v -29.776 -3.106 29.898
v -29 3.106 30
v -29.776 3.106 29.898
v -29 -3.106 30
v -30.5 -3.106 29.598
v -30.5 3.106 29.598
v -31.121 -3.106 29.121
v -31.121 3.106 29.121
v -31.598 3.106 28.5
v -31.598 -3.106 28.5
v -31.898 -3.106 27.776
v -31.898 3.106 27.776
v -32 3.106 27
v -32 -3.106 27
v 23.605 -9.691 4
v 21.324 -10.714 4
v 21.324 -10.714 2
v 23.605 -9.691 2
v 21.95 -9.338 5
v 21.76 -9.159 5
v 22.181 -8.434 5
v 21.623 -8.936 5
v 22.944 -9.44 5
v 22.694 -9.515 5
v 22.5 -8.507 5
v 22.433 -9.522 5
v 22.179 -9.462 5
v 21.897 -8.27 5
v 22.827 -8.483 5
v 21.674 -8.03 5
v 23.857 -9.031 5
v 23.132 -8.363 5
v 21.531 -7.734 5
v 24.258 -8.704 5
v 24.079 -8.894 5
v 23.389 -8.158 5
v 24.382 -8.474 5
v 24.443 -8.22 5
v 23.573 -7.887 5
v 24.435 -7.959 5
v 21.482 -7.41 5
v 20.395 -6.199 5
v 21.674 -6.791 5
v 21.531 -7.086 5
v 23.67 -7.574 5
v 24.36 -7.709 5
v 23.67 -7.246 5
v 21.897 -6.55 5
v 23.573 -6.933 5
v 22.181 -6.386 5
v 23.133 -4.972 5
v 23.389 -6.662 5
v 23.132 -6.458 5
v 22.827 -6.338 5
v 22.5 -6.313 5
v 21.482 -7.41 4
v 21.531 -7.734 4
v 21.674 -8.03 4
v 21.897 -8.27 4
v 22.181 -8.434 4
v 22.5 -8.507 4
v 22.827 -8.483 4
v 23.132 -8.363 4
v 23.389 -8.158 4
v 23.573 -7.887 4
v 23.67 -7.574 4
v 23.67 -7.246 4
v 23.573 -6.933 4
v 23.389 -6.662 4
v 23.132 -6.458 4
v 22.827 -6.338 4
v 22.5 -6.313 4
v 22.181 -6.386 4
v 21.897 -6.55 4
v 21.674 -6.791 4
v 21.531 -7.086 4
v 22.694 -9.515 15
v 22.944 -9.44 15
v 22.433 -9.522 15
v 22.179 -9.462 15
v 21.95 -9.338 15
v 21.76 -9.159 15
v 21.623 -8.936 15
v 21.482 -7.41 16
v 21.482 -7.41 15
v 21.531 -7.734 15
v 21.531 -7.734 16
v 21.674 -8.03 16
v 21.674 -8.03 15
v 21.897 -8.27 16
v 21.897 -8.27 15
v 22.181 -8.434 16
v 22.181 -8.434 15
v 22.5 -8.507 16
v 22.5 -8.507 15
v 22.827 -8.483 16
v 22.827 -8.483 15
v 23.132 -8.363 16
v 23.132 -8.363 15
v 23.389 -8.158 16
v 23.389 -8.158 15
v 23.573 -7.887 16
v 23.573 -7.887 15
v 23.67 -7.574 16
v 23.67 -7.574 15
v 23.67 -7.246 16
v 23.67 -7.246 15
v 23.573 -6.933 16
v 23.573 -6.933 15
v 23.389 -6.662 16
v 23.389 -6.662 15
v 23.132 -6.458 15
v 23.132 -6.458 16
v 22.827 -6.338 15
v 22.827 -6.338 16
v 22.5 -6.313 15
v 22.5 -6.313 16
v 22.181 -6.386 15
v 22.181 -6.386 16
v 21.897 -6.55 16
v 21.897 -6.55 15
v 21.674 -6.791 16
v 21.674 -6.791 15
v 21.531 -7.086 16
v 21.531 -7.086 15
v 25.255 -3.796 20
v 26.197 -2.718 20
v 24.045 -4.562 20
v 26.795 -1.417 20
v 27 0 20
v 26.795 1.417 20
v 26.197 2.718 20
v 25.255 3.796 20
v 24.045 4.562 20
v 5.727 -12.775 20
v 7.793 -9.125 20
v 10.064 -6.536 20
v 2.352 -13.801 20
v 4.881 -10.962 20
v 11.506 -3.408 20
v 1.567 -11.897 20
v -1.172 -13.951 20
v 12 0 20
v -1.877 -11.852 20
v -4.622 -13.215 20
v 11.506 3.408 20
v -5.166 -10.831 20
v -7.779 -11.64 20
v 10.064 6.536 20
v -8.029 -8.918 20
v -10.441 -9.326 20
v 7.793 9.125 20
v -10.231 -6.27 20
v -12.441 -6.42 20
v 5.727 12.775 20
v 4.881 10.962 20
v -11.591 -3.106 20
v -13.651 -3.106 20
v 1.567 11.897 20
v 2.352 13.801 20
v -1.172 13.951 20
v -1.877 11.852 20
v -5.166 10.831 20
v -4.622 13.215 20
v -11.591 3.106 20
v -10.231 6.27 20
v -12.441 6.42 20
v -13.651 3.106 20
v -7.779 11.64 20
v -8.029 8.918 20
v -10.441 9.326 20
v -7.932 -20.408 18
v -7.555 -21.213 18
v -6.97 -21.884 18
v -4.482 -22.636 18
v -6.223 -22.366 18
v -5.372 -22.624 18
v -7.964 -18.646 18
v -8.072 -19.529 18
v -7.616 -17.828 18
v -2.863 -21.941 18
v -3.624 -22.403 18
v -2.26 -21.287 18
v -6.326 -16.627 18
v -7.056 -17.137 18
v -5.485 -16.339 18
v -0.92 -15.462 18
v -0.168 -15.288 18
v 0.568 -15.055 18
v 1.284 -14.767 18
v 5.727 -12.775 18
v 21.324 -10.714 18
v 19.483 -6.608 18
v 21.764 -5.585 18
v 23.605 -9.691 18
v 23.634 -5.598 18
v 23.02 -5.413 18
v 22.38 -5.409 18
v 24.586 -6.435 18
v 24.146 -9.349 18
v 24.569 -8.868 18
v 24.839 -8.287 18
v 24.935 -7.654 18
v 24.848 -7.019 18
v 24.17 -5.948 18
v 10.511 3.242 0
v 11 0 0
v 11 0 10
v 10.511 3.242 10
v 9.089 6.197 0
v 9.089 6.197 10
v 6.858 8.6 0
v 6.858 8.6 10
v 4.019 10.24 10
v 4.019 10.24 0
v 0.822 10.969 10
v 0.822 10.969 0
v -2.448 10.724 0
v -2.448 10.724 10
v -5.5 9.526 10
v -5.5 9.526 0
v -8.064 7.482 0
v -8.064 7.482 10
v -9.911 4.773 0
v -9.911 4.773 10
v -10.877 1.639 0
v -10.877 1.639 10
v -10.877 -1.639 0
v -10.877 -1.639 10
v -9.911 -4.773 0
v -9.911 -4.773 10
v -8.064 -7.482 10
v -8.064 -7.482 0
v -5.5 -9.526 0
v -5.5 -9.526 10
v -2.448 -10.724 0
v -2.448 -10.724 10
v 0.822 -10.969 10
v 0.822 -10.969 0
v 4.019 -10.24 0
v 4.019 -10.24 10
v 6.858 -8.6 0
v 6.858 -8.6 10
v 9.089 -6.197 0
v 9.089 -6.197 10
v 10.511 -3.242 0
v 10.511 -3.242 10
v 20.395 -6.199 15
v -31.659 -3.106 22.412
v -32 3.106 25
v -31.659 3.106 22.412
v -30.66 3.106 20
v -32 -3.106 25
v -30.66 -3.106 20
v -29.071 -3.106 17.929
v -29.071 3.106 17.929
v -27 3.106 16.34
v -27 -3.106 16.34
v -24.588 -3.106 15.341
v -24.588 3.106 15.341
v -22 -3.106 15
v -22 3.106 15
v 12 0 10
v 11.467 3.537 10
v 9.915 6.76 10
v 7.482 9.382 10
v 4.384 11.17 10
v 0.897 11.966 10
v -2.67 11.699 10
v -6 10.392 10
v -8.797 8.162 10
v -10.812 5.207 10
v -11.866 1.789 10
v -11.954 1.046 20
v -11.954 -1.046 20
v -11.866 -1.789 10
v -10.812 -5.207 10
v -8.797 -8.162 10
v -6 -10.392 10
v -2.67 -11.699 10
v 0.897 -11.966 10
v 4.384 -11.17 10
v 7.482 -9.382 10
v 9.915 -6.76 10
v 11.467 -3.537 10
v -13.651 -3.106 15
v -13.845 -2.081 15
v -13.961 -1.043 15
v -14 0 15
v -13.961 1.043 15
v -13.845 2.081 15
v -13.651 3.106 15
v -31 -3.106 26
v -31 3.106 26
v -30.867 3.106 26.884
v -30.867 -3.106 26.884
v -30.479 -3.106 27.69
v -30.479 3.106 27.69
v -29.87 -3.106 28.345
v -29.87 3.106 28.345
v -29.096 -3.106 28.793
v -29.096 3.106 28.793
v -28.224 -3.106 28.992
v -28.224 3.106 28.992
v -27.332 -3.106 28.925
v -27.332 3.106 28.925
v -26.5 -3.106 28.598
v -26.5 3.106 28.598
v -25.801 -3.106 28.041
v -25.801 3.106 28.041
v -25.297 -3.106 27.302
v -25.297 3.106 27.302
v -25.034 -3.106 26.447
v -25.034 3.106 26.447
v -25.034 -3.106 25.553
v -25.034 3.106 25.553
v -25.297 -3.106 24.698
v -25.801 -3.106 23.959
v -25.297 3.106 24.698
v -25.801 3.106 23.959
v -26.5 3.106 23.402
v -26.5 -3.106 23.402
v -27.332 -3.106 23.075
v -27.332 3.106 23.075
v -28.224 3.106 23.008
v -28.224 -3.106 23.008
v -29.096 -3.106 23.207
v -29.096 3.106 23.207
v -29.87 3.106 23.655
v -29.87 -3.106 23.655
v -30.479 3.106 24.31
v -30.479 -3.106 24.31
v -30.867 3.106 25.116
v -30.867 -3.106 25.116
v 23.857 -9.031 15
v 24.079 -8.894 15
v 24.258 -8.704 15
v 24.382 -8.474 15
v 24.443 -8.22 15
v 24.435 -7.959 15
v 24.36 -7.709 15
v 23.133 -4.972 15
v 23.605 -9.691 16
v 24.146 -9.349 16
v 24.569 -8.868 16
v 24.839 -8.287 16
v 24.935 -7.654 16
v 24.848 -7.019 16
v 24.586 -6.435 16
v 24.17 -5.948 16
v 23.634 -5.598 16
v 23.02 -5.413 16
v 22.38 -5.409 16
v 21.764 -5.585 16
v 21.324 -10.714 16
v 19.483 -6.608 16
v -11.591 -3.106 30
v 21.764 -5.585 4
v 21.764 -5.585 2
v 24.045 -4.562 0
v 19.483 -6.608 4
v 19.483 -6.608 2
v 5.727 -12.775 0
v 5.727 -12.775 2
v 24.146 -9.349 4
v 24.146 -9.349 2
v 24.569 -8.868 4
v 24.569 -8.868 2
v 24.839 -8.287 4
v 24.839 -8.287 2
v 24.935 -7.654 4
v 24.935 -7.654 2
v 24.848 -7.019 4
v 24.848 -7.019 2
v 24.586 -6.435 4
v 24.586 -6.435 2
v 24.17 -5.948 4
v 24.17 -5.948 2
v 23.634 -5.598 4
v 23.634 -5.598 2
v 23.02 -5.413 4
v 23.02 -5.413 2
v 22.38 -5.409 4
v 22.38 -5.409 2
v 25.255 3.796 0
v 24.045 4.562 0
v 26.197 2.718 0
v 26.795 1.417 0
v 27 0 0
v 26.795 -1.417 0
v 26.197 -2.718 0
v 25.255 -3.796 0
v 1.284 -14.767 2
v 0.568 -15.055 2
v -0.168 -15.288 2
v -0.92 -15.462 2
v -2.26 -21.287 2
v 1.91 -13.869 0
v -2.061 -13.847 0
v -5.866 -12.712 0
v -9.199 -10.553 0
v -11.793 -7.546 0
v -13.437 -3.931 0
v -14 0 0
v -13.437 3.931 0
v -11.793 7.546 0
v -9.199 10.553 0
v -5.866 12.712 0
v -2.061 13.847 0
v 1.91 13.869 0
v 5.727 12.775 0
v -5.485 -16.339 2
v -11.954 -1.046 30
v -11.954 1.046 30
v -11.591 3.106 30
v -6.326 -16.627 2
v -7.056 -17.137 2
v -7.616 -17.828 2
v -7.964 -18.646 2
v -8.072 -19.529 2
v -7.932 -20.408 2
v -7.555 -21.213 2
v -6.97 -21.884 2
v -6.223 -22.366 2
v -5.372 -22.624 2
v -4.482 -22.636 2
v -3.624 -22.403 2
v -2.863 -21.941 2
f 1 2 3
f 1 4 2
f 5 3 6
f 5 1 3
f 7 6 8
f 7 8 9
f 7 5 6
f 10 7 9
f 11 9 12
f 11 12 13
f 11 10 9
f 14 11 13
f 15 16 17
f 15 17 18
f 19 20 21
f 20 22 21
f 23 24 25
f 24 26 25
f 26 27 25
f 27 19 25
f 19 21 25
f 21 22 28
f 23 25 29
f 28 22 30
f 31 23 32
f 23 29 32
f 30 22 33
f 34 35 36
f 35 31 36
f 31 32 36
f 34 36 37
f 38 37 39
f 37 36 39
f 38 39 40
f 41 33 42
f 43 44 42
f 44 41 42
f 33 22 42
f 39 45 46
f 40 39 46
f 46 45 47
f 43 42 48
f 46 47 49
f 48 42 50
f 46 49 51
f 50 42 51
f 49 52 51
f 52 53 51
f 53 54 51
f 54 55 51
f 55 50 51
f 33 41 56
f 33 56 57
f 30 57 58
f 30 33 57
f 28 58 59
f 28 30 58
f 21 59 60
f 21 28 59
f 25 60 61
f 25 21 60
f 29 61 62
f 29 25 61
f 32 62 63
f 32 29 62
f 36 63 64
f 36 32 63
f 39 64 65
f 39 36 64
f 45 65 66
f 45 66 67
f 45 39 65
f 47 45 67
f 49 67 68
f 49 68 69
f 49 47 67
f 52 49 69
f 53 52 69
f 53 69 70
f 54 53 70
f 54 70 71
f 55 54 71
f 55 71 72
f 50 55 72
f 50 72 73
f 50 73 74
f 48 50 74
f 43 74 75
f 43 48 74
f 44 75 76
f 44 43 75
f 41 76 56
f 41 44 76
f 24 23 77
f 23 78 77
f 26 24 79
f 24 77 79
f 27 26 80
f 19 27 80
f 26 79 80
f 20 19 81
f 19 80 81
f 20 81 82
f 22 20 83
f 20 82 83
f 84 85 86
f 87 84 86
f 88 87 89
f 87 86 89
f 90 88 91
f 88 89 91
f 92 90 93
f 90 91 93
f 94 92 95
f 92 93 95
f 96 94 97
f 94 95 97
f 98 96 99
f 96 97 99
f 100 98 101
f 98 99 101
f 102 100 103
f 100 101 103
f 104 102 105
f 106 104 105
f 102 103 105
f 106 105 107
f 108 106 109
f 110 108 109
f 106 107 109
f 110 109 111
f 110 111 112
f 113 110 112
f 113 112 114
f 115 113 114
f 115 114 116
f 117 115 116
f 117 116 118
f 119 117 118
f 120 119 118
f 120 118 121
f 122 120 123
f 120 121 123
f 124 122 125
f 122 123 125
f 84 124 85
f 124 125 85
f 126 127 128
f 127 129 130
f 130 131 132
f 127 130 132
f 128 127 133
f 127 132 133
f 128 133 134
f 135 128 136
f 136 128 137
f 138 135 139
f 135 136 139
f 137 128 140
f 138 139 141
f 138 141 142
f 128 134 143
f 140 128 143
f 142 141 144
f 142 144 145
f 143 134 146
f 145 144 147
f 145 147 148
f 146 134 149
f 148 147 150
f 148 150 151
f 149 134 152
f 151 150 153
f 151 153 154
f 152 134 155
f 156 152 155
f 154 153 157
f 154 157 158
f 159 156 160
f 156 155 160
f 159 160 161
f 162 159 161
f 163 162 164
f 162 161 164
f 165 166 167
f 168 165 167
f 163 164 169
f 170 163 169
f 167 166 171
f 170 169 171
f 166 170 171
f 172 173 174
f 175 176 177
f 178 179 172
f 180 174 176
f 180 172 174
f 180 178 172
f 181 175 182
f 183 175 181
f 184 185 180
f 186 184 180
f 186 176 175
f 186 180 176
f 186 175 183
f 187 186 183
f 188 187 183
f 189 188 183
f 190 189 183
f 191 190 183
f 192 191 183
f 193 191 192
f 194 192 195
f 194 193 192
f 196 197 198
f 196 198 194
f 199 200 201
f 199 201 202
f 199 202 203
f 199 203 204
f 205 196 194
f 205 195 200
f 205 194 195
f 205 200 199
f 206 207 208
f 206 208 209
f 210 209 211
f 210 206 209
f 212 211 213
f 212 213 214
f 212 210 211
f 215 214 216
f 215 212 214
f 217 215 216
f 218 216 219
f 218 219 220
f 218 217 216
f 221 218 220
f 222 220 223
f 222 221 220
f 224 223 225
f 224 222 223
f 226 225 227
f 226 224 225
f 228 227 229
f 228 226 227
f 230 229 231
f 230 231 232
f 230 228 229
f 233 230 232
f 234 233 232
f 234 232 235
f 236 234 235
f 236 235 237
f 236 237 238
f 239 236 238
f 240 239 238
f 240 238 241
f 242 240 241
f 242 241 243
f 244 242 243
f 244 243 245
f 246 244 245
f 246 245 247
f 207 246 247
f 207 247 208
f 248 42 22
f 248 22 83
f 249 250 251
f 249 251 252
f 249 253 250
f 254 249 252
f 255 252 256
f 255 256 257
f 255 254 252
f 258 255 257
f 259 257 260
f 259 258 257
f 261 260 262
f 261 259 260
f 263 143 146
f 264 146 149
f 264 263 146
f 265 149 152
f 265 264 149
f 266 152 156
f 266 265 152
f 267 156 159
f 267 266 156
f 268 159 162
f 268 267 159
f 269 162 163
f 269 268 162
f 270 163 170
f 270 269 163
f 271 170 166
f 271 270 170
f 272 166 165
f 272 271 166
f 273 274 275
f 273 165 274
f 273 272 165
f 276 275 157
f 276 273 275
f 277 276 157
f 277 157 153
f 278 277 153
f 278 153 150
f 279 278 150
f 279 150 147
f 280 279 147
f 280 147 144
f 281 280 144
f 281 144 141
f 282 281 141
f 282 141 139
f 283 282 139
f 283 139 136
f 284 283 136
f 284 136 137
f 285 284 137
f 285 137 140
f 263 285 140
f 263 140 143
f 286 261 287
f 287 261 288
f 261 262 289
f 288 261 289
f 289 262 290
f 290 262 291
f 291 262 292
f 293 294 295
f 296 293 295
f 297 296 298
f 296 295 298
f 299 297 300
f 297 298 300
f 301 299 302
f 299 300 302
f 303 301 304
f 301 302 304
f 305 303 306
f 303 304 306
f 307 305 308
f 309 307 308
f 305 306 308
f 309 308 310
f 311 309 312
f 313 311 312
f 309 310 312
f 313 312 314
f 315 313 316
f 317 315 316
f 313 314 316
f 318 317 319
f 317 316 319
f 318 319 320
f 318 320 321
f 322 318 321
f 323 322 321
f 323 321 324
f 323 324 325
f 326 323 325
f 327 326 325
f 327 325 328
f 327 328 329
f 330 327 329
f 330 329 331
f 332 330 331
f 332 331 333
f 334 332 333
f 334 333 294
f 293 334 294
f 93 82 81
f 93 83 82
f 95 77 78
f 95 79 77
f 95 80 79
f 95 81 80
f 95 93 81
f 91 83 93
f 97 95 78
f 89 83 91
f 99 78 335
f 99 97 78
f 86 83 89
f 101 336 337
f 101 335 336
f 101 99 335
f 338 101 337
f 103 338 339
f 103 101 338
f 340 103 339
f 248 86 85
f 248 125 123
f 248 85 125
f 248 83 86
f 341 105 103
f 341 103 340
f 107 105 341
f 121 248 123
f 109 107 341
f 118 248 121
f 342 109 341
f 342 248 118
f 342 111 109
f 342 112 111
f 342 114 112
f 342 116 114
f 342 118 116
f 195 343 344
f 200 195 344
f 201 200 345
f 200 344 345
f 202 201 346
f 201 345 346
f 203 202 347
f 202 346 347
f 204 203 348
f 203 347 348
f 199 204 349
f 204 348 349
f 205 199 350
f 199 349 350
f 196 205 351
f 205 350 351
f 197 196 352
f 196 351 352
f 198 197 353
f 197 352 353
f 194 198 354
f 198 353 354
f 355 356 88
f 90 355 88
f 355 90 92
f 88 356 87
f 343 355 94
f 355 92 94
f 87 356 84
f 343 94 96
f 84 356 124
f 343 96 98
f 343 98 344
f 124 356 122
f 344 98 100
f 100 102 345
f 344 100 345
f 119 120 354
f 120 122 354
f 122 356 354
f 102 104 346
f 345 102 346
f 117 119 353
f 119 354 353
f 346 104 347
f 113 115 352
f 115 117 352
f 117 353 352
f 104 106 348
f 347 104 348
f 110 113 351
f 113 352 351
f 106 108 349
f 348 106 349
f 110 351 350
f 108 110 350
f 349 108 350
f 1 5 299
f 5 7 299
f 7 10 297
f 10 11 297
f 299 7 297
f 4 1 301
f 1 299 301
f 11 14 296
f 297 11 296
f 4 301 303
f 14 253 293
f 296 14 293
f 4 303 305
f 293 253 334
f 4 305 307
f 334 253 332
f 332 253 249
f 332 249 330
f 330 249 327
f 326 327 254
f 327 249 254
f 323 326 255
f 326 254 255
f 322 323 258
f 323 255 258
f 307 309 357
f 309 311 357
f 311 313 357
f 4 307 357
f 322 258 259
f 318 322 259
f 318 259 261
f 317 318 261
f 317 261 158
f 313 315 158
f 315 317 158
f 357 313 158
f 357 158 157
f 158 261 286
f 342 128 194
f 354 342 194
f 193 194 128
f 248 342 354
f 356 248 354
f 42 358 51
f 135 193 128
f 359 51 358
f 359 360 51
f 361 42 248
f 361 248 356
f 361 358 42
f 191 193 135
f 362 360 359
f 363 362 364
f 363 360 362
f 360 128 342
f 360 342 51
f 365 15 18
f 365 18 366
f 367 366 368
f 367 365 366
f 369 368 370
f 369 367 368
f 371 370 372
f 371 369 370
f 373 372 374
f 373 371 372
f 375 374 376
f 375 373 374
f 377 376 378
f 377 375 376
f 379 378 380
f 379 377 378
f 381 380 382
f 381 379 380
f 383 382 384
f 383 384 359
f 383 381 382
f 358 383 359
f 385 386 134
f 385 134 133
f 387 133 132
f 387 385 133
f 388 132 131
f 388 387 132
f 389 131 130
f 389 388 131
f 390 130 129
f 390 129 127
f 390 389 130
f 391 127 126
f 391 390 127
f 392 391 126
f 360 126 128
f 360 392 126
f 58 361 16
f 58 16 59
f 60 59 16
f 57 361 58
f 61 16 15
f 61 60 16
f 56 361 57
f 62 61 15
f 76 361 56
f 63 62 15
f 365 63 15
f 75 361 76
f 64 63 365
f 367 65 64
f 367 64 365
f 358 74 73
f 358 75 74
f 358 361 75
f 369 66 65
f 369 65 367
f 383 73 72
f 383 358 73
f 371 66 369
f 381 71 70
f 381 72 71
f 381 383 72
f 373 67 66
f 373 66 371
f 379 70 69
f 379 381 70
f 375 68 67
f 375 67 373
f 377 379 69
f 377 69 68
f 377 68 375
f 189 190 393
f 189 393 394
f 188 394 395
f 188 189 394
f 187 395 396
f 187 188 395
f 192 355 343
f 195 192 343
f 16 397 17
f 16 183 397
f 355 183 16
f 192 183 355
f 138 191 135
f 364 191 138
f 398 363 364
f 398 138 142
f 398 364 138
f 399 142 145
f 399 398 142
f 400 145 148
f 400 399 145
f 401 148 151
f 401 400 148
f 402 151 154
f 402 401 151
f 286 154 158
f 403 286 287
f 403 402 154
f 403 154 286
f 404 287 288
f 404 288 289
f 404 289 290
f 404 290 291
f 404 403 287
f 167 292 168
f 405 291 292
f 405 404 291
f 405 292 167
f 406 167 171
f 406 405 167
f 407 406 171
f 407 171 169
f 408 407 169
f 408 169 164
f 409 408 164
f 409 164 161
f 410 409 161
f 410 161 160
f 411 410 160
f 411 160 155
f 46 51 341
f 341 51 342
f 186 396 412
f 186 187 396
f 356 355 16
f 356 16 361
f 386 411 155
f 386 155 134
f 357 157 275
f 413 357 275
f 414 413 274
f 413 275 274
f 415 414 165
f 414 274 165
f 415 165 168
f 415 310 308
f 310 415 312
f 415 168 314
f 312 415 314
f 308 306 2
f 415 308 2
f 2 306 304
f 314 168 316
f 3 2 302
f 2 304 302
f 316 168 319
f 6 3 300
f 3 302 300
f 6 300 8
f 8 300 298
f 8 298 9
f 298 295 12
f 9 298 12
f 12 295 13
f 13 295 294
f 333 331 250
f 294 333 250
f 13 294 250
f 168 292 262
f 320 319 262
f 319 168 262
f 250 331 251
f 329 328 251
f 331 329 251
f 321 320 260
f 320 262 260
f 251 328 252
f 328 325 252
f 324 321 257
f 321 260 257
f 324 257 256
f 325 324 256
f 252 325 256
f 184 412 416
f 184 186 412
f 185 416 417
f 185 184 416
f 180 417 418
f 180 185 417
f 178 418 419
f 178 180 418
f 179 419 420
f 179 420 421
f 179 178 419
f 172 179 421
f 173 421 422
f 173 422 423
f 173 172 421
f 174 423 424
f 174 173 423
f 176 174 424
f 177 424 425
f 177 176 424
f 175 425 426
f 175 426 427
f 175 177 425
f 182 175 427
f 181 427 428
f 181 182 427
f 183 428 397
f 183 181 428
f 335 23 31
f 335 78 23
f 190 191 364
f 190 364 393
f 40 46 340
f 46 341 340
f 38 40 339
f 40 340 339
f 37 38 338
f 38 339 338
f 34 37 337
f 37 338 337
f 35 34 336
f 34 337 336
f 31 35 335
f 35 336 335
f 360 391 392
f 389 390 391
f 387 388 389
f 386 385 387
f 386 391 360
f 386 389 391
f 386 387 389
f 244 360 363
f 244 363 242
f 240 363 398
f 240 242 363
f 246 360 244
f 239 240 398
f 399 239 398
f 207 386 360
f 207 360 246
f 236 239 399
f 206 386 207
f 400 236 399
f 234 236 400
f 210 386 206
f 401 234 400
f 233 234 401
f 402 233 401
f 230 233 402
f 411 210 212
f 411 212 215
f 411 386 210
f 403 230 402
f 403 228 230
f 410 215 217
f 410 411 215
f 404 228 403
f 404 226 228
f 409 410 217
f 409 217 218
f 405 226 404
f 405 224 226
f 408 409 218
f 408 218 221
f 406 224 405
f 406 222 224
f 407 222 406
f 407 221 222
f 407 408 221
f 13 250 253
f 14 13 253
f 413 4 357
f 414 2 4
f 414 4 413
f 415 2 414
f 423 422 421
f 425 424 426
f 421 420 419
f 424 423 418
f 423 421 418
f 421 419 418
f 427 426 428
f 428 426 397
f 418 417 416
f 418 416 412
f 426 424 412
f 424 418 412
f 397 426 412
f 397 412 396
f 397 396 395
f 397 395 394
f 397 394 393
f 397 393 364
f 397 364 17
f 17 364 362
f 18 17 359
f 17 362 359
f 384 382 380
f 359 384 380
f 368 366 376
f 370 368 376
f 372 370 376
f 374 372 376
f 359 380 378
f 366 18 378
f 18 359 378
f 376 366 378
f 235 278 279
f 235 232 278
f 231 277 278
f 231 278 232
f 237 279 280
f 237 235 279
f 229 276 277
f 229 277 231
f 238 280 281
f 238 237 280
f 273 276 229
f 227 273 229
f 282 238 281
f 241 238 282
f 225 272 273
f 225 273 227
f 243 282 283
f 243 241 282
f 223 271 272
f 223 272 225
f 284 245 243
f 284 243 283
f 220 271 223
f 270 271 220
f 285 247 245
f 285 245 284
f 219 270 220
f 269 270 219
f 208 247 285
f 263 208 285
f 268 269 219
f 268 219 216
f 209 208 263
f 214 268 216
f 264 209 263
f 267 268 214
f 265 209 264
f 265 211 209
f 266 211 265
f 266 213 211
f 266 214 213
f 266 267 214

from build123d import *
from build123d.topology import SkipClean

# Parameters (mm, degrees)
ESQUISSE2_R             = 11
BOSS_EXTRU_1_DEPTH      = 20
ENL_V_START             = -10
ESQUISSE3_R             = 12
ESQUISSE3_R_2           = 11
ENL_V_MAT_EXTRU_1_DEPTH = 10
ESQUISSE4_W             = 3
ESQUISSE4_H             = 10
BOSS_EXTRU_2_DEPTH      = 4
ESQUISSE5_R             = 1.1
BOSS_EXTRU_3_DEPTH      = 1
ESQUISSE9_R             = 1.1
BOSS_EXTRU_5_DEPTH      = 2
BOSS_EXTRU_6_START      = -6
BOSS_EXTRU_6_DEPTH      = 8
CONG_1_R                = 1
CONG_2_R                = 1
BOSS_EXTRU_7_DEPTH      = 10
BOSS_EXTRU_8_DEPTH      = 10
BOSS_EXTRU_8_DEPTH_BACK = 5
CONG_3_R                = 10
CONG_4_R                = 3
ENL_V_MAT_EXTRU_2_REACH = 52.872
ESQUISSE11_R            = 3


with BuildPart() as part:
    # Esquisse2 → Boss.-Extru.1 (new body)
    with BuildSketch(Plane.XY):
        with BuildLine():
            Line((5.727272727, 12.774910845), (24.045454545, 4.562468159))
            ThreePointArc((24.045454545, 4.562468159), (27, 0), (24.045454545, -4.562468159))
            Line((24.045454545, -4.562468159), (5.727272727, -12.774910845))
            ThreePointArc((5.727272727, -12.774910845), (-14, 0), (5.727272727, 12.774910845))
        make_face()
        Circle(ESQUISSE2_R, mode=Mode.SUBTRACT)
    extrude(amount=BOSS_EXTRU_1_DEPTH)

    # Esquisse3 → Enlèv. mat.-Extru.1 (cut)
    with BuildSketch(Plane.XY.offset(20).offset(ENL_V_START)):
        Circle(ESQUISSE3_R)
        Circle(ESQUISSE3_R_2, mode=Mode.SUBTRACT)
    extrude(amount=ENL_V_MAT_EXTRU_1_DEPTH, mode=Mode.SUBTRACT)

    # Esquisse4 → Boss.-Extru.2 (add)
    with BuildSketch(Plane(origin=(5.727272727, -12.774910845, 0), x_dir=(0.9124936318129423, 0.4090909090909094, 0), z_dir=(0.40909090909090934, -0.9124936318129422, 0))):
        with Locations((17.5748599, 10)):
            Rectangle(ESQUISSE4_W, ESQUISSE4_H)
    extrude(amount=BOSS_EXTRU_2_DEPTH)

    # Esquisse5 → Boss.-Extru.3 (add)
    with BuildSketch(Plane.XY.offset(15)):
        with Locations(Location((22.582402284, -7.410182695, 0), (0, 0, 180))):
            Circle(ESQUISSE5_R)
    boss_extru_3 = extrude(amount=BOSS_EXTRU_3_DEPTH)

    # Symétrie1: Boss.-Extru.3 across plane
    add(boss_extru_3.mirror(Plane.XY.offset(10)))

    # Esquisse9 → Boss.-Extru.5 (add)
    # profile 1 of 2: a face of its own
    with BuildSketch(Plane.XY.offset(16)):
        with BuildLine():
            Line((21.323895477, -10.714144048), (23.605129557, -9.691416775))
            ThreePointArc((23.605129557, -9.691416775), (24.737785683, -6.717851558), (21.764220466, -5.585195432))
            Line((21.764220466, -5.585195432), (19.482986386, -6.607922705))
            Line((19.482986386, -6.607922705), (21.323895477, -10.714144048))
        make_face()
        with Locations(Location((22.582402284, -7.410182695, 0), (0, 0, 180))):
            Circle(ESQUISSE9_R, mode=Mode.SUBTRACT)
    # profile 2 of 2: a face of its own
    with BuildSketch(Plane.XY.offset(16)):
        with Locations(Location((22.582402284, -7.410182695, 0), (0, 0, 180))):
            Circle(ESQUISSE9_R)
    boss_extru_5 = extrude(amount=BOSS_EXTRU_5_DEPTH)

    # Esquisse9<4> → Boss.-Extru.6 (add)
    with BuildSketch(Plane.XY.offset(16).offset(BOSS_EXTRU_6_START)):
        with BuildLine():
            Line((-2.260153649, -21.287390546), (21.323895477, -10.714144048))
            Line((21.323895477, -10.714144048), (19.482986386, -6.607922705))
            Line((19.482986386, -6.607922705), (1.283727254, -14.767049742))
            ThreePointArc((1.283727254, -14.767049742), (0.201847525, -15.178661138), (-0.920349818, -15.462493505))
            Line((-0.920349818, -15.462493505), (-5.484659611, -16.339454049))
            ThreePointArc((-5.484659611, -16.339454049), (-7.55515779, -21.213423405), (-2.260153649, -21.287390546))
        make_face()
    boss_extru_6 = extrude(amount=BOSS_EXTRU_6_DEPTH)

    # Symétrie2: Boss.-Extru.5, Boss.-Extru.6 across plane
    add(boss_extru_5.mirror(Plane.XY.offset(10)))
    add(boss_extru_6.mirror(Plane.XY.offset(10)))

    # Congé1
    cong_1_edges = [part.edges().sort_by_distance(p)[0] for p in [
        (24.76932455, -8.621533595, 10),
    ]]
    fillet(cong_1_edges, radius=CONG_1_R)

    # Congé2
    cong_2_edges = [part.edges().sort_by_distance(p)[0] for p in [
        (22.031843655, -9.848806323, 10),
    ]]
    fillet(cong_2_edges, radius=CONG_2_R)

    # Esquisse10 → Boss.-Extru.7 (add)
    with SkipClean():  # the faces are left unmerged after this step: merging them gives an invalid solid
        with BuildSketch(Plane.XY.offset(20)):
            with BuildLine():
                Line((-13.651031791, -3.10633724), (-11.590973598, -3.10633724))
                ThreePointArc((-11.590973598, -3.10633724), (-12, 0), (-11.590973598, 3.10633724))
                Line((-11.590973598, 3.10633724), (-13.651031791, 3.10633724))
                ThreePointArc((-13.651031791, 3.10633724), (-14, 0), (-13.651031791, -3.10633724))
            make_face()
        extrude(amount=BOSS_EXTRU_7_DEPTH)

    # Esquisse10<3> → Boss.-Extru.8 (add, two sides: drawn at the far end of the back side and taken through both)
    with SkipClean():  # the faces are left unmerged after this step: merging them gives an invalid solid
        with BuildSketch(Plane.XY.offset(20).offset(-BOSS_EXTRU_8_DEPTH_BACK)):
            with BuildLine():
                Line((-32, -3.10633724), (-13.651031791, -3.10633724))
                ThreePointArc((-13.651031791, -3.10633724), (-13.912484413, -1.562938727), (-14, 0))
                ThreePointArc((-14, 0), (-13.912484413, 1.562938727), (-13.651031791, 3.10633724))
                Line((-13.651031791, 3.10633724), (-32, 3.10633724))
                Line((-32, 3.10633724), (-32, -3.10633724))
            make_face()
        extrude(amount=BOSS_EXTRU_8_DEPTH + BOSS_EXTRU_8_DEPTH_BACK)

    # Congé3
    cong_3_edges = [part.edges().sort_by_distance(p)[0] for p in [
        (-32, 0, 15),
    ]]
    fillet(cong_3_edges, radius=CONG_3_R)

    # Congé4
    cong_4_edges = [part.edges().sort_by_distance(p)[0] for p in [
        (-32, 0, 30),
    ]]
    fillet(cong_4_edges, radius=CONG_4_R)

    # Esquisse11 → Enlèv. mat.-Extru.2 (cut, up to next)
    with BuildSketch(Plane(origin=(0, 3.10633724, 0), x_dir=(1, 0, 0), z_dir=(0, 1, 0)), mode=Mode.PRIVATE) as enl_v_mat_extru_2_sk1:
        with Locations(Location((-28, -26, 0), (0, 0, 180))):
            Circle(ESQUISSE11_R)
    enl_v_mat_extru_2_tool1 = extrude(enl_v_mat_extru_2_sk1.sketch, amount=-ENL_V_MAT_EXTRU_2_REACH, mode=Mode.PRIVATE) & part.part
    add(enl_v_mat_extru_2_tool1.solids().sort_by_distance((-28, 3.106337, 26))[0], mode=Mode.SUBTRACT)


solid = part.part
